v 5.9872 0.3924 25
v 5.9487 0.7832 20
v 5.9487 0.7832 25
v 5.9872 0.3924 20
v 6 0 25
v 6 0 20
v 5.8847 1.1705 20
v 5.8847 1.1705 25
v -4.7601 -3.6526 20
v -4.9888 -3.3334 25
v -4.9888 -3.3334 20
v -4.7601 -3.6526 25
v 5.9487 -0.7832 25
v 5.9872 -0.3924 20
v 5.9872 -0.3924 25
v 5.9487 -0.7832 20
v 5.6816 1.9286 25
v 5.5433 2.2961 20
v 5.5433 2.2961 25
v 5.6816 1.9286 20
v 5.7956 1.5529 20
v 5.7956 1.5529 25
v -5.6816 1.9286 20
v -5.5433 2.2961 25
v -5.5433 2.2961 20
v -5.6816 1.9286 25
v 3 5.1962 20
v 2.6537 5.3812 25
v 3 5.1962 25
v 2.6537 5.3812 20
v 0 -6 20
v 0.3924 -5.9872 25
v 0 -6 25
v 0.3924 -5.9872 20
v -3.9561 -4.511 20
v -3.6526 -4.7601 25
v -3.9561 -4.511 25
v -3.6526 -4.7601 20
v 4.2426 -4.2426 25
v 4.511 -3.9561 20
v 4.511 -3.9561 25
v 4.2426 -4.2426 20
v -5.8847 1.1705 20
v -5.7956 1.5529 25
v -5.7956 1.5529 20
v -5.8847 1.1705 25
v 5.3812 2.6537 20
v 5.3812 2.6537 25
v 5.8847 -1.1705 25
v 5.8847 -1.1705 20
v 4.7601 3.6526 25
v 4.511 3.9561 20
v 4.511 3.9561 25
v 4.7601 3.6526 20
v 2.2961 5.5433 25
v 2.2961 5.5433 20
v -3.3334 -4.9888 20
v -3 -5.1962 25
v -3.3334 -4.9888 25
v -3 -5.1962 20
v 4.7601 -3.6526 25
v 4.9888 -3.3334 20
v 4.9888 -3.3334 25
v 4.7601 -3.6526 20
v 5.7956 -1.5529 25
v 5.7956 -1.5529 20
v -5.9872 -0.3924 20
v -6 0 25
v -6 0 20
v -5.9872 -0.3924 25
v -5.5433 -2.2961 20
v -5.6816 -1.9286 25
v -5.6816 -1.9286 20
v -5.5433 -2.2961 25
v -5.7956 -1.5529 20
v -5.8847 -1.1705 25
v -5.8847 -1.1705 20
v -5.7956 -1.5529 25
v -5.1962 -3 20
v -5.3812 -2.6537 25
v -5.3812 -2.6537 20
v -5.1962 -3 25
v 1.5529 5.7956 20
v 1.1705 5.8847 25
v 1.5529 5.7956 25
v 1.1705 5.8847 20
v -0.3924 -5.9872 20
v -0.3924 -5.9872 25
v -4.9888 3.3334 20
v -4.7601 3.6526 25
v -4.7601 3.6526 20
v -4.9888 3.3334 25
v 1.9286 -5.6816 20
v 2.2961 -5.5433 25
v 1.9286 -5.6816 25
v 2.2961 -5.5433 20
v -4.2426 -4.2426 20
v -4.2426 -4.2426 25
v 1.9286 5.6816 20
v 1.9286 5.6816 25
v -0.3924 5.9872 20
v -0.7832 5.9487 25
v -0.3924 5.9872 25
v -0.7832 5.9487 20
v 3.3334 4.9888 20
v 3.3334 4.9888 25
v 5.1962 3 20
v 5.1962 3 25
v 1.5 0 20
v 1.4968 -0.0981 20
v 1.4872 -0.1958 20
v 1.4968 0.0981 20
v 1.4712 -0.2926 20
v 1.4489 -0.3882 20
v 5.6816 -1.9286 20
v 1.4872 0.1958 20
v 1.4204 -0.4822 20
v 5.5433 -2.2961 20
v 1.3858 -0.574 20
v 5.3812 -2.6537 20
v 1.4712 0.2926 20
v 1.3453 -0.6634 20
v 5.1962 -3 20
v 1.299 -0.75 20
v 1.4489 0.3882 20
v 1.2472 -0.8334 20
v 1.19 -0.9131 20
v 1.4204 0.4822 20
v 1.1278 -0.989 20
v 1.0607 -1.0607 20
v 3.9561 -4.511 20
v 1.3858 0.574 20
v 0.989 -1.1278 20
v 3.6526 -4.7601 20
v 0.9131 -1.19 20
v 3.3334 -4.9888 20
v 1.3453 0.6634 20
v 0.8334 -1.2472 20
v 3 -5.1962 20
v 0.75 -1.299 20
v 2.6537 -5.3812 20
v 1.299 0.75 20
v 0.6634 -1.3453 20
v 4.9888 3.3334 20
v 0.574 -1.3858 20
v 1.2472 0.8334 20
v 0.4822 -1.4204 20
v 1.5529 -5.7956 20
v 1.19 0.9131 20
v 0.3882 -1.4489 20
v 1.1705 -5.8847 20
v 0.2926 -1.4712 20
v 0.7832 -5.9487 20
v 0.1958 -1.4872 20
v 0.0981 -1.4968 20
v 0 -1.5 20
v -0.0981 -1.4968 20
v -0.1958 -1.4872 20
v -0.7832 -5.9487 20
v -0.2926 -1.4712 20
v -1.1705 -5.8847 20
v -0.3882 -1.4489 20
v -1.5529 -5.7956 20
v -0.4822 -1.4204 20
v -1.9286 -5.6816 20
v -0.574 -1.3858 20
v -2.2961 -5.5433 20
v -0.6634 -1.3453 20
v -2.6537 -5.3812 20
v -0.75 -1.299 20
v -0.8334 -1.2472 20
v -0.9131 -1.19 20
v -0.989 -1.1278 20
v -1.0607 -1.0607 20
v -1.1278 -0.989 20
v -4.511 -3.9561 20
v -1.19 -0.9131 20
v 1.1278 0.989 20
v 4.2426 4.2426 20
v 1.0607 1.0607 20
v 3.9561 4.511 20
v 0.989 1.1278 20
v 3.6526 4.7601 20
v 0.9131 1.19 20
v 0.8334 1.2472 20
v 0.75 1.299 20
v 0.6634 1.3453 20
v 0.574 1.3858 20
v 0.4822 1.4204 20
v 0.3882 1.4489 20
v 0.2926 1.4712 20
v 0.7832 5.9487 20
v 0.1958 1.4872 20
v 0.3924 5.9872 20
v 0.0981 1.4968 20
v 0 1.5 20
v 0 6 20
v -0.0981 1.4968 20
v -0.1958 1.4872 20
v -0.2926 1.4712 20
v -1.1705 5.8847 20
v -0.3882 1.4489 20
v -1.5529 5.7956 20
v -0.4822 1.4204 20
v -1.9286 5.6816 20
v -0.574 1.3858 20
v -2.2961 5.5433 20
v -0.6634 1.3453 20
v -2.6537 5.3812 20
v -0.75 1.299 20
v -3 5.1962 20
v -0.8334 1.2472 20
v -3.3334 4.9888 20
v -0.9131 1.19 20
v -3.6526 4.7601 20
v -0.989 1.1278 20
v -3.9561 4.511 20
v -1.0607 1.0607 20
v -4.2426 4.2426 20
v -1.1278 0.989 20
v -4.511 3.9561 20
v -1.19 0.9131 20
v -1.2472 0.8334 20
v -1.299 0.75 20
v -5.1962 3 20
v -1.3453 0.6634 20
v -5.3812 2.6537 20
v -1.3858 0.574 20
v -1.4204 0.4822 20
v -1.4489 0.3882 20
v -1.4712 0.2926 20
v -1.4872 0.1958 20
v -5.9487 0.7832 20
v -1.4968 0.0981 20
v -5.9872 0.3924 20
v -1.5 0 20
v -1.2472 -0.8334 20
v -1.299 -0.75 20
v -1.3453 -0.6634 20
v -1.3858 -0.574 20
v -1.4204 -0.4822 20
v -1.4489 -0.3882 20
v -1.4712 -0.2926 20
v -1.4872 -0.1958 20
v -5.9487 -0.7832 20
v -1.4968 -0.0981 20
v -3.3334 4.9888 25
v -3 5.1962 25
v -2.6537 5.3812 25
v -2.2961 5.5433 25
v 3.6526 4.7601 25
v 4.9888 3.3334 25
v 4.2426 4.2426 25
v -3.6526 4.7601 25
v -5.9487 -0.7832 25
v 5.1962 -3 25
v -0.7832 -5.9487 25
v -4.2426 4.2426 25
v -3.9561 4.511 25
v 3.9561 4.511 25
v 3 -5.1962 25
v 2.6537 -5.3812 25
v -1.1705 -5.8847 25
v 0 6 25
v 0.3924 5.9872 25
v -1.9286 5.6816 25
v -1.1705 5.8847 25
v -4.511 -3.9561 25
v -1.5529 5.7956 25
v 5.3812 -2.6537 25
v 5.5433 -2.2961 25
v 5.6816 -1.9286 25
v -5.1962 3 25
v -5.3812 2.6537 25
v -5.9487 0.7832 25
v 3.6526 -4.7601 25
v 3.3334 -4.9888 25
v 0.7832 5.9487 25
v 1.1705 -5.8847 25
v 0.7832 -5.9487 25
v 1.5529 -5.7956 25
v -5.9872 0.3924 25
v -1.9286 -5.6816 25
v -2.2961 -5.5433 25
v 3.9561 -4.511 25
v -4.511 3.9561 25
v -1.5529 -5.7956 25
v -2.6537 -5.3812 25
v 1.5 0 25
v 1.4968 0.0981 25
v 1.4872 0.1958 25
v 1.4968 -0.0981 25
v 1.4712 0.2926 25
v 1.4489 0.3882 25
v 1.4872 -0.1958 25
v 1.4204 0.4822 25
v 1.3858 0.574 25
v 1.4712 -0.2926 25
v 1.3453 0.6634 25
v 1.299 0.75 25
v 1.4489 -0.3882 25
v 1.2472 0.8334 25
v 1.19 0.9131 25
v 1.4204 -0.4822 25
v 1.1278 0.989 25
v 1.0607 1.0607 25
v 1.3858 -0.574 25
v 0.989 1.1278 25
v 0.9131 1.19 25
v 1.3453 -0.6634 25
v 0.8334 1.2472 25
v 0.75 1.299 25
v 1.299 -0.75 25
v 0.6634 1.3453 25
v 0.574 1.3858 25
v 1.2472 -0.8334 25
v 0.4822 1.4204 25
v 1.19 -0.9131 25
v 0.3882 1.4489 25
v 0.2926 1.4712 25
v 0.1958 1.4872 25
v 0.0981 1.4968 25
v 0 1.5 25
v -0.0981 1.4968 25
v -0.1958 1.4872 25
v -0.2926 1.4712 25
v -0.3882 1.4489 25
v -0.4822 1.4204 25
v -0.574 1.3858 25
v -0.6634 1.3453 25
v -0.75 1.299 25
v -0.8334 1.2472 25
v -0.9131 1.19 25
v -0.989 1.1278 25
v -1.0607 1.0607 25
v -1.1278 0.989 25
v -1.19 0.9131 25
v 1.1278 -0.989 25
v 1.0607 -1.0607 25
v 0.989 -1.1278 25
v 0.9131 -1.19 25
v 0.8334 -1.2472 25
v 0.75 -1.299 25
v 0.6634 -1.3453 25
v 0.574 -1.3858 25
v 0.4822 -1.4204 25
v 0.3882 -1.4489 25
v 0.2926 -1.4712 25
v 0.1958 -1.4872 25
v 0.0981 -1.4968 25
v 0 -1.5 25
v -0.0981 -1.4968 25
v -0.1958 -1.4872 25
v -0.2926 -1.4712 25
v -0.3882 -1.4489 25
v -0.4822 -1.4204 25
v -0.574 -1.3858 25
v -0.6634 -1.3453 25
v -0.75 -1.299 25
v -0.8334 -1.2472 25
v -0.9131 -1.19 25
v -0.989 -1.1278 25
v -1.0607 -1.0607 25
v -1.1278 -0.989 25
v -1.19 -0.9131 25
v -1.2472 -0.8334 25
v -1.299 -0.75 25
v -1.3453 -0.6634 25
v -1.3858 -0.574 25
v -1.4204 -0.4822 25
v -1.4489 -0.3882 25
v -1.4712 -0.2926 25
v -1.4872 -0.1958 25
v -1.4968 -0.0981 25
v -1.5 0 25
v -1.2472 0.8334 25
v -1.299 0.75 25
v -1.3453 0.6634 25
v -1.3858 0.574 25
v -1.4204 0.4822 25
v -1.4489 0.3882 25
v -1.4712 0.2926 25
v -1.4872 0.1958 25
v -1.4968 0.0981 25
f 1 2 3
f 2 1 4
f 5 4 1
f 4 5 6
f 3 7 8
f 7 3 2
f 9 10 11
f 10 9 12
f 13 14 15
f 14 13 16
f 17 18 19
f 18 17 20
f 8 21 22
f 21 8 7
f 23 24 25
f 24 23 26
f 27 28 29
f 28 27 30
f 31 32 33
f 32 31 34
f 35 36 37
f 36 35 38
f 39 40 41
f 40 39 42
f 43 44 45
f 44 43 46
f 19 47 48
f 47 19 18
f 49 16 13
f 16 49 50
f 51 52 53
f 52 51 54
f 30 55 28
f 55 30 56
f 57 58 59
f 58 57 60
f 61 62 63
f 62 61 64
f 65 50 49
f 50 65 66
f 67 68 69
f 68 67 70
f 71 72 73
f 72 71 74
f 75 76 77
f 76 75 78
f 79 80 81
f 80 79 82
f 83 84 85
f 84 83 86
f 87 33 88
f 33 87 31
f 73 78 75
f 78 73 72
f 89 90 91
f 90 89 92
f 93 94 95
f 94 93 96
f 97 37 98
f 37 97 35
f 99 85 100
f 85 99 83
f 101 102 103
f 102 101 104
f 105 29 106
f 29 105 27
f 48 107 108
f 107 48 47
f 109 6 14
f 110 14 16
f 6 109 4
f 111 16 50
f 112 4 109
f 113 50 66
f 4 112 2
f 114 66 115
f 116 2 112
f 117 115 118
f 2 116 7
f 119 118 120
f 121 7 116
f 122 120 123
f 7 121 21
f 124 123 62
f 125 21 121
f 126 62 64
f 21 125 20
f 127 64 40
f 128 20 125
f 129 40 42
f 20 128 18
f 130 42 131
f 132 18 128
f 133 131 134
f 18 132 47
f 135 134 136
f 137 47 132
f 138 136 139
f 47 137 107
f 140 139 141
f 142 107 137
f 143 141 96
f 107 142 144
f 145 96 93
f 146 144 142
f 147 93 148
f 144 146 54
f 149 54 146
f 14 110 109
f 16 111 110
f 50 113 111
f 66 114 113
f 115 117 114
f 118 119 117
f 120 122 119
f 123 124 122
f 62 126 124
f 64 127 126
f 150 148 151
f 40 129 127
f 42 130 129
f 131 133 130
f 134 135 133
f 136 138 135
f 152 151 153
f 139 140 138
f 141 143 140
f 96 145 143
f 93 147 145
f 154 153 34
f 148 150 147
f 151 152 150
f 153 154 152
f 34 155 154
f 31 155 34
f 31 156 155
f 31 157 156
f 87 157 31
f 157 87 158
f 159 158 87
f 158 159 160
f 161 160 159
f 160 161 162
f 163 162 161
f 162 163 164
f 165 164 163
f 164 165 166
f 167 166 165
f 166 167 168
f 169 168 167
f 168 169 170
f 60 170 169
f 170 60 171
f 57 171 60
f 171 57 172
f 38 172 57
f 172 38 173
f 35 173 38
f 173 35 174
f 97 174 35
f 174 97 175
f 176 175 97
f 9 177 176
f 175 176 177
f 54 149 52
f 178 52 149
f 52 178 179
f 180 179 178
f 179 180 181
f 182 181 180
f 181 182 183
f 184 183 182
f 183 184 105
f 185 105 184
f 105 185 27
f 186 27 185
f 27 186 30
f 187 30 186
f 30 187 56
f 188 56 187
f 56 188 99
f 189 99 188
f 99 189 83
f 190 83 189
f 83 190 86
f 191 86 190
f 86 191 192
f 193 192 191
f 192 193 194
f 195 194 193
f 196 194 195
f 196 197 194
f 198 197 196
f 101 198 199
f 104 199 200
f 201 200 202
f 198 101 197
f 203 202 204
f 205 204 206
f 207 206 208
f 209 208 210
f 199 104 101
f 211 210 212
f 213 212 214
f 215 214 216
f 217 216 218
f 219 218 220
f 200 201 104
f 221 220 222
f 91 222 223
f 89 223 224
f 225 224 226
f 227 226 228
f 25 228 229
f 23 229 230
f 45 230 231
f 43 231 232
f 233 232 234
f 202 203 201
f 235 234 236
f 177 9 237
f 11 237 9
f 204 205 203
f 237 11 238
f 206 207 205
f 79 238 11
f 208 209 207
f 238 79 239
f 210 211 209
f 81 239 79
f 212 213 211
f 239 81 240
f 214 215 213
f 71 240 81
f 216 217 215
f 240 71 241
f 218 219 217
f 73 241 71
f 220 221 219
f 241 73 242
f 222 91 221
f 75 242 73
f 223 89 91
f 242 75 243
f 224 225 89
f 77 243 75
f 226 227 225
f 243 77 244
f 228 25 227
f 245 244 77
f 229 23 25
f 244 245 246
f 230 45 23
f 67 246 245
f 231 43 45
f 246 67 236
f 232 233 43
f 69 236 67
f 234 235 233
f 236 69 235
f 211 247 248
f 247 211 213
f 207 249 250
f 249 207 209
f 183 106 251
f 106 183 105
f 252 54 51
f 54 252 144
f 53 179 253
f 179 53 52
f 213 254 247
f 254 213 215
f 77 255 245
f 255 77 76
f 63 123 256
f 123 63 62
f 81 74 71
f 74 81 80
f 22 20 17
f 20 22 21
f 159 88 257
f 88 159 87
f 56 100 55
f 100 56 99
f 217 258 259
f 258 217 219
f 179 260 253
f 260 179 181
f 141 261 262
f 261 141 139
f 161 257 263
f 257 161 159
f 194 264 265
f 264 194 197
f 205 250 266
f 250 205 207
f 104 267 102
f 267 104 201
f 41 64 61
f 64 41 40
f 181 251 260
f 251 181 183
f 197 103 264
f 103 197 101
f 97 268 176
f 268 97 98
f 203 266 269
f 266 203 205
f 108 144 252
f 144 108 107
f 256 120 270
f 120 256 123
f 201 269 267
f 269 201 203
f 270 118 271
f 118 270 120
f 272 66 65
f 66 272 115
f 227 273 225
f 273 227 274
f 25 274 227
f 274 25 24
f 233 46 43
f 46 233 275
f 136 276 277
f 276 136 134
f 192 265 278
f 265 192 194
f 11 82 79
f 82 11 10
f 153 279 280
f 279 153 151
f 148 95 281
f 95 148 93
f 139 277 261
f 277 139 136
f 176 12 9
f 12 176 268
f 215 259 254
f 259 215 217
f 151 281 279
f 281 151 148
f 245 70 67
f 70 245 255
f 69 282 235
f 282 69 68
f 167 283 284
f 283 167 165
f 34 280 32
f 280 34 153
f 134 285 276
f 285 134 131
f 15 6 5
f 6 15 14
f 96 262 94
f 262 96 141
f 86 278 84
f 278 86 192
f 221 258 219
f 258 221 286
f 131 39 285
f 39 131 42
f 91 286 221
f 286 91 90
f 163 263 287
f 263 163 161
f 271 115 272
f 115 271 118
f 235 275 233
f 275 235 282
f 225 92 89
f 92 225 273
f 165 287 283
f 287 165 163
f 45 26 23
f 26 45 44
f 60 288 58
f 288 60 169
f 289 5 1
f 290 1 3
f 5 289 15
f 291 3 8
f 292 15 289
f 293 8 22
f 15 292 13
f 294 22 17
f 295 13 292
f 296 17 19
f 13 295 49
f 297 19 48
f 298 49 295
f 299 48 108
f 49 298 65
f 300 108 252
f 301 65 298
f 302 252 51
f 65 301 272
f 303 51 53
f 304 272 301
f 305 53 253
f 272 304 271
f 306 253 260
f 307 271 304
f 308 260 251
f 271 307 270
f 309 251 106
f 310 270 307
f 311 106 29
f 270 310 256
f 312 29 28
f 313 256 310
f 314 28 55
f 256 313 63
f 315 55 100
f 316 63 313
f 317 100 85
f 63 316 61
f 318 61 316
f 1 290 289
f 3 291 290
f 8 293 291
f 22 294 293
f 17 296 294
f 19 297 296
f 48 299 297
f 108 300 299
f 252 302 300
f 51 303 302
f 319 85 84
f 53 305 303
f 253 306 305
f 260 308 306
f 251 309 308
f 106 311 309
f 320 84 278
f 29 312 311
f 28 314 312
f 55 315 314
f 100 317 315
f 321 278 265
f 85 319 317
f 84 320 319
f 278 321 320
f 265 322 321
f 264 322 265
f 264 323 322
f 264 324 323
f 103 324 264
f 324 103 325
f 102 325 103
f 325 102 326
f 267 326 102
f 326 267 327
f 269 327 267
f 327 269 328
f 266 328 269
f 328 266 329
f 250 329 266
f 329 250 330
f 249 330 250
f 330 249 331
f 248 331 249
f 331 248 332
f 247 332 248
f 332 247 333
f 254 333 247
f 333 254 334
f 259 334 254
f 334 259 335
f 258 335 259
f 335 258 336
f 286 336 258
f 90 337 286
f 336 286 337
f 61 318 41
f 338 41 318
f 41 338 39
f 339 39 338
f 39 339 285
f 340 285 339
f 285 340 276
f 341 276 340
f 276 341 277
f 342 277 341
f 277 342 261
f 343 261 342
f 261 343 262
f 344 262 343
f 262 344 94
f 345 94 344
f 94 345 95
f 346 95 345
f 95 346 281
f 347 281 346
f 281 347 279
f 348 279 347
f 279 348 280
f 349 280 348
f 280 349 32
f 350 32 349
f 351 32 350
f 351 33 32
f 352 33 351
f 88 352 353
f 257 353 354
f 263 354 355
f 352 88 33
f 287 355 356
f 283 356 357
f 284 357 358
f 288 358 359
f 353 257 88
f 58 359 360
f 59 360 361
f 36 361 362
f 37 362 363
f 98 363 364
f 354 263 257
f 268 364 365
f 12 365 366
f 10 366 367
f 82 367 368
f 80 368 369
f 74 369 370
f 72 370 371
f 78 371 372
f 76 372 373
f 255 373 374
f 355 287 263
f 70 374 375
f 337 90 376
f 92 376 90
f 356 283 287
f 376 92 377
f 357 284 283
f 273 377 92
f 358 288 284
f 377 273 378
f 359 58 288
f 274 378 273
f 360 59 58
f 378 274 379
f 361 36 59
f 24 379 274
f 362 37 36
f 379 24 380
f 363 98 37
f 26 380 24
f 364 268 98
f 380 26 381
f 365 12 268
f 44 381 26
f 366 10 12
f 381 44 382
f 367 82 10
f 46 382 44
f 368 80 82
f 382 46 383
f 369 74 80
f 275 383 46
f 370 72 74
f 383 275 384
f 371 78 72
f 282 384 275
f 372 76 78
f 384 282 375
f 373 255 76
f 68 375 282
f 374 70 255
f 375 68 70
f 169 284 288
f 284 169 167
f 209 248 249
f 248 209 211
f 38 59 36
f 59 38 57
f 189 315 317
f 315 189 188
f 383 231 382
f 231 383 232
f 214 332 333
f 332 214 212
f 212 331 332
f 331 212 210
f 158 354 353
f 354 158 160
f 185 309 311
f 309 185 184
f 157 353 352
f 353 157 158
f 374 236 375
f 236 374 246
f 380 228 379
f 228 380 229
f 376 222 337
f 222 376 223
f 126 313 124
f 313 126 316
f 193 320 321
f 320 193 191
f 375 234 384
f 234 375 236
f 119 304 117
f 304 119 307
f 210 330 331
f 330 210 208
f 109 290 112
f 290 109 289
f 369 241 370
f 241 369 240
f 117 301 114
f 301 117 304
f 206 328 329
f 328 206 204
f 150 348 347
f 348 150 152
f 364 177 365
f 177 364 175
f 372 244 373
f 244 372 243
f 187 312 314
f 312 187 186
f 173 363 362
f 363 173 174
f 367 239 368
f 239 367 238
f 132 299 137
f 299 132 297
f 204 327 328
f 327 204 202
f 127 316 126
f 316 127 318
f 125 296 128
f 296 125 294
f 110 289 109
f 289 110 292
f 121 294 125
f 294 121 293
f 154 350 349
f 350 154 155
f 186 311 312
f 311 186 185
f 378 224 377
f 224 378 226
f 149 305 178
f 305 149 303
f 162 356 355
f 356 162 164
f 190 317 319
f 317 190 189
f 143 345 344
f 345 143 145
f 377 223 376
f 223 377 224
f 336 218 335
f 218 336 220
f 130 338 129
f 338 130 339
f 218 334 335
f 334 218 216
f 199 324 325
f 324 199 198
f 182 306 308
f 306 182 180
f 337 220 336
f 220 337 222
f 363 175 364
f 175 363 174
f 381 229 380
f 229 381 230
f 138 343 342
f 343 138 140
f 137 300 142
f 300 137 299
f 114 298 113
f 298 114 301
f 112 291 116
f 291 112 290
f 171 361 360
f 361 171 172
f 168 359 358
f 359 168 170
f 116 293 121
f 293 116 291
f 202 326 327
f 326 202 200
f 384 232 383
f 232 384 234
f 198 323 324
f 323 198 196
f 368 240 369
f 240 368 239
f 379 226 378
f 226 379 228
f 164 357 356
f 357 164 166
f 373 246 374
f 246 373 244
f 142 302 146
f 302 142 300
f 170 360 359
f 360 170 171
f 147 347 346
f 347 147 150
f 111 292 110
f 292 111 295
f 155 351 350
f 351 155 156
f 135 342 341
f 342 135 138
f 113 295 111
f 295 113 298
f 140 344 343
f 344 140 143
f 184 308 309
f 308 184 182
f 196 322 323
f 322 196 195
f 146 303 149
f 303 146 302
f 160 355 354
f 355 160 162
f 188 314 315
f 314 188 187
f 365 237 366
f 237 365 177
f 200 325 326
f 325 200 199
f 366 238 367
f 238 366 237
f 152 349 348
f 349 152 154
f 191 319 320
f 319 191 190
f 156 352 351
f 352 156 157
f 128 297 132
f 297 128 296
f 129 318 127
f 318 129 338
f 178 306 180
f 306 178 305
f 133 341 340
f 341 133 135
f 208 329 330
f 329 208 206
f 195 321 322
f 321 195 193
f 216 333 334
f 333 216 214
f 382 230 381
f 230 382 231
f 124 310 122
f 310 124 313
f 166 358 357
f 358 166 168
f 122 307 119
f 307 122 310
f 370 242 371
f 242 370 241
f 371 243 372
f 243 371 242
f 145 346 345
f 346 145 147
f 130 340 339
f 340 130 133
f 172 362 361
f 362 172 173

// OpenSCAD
// Hose-barb reducer: 8 mm tubing (barbs) -> 5 mm tubing (barbs)
// Print orientation: standing upright along Z, centred on origin in X/Y

// ---------------- Parameters ----------------
bore       = 3;    // through-bore diameter (mm)
eps        = 0.5;  // cutter overshoot past faces (mm)

// Lower section (z = 0 .. 20): 8 mm tubing barbs
z_barb_a   = 20;   // height of lower barbs (mm)
outer_a    = [7.5, 9.5]; // outer diameter at bottom and top of barb (mm)
n_barb_a   = 2;    // number of barbs, stacked

// Collar (z = 20 .. 25)
z_collar   = 5;    // collar thickness (mm)
d_collar   = 12;   // collar outer diameter (mm)

// Upper section (z = 25 .. 41): 5 mm tubing barbs
z_barb_b   = 16;   // height of upper barbs (mm)
outer_b    = [6.5, 5.0]; // outer diameter at bottom and top of barb (mm)
n_barb_b   = 2;    // number of barbs, stacked

total_h    = z_barb_a + z_collar + z_barb_b; // = 41 mm

$fn = 96;          // curve resolution

// ---------------- Model ----------------
difference() {
    union() {
        // Lower barbs
        for (i = [0 : n_barb_a - 1])
            translate([0, 0, i * z_barb_a / n_barb_a])
                linear_extrude(height = z_barb_a / n_barb_a)
                    polygon(points = [
                        [-outer_a[0] / 2, 0],
                        [ outer_a[0] / 2, 0],
                        [ outer_a[1] / 2, 0],
                        [0, outer_a[1] / 2],
                        [0, -outer_a[1] / 2]
                    ]);

        // Collar
        translate([0, 0, z_barb_a])
            cylinder(h = z_collar, d = d_collar);

        // Upper barbs
        for (i = [0 : n_barb_b - 1])
            translate([0, 0, z_barb_a + z_collar + i * z_barb_b / n_barb_b])
                linear_extrude(height = z_barb_b / n_barb_b)
                    polygon(points = [
                        [-outer_b[0] / 2, 0],
                        [ outer_b[0] / 2, 0],
                        [ outer_b[1] / 2, 0],
                        [0, outer_b[1] / 2],
                        [0, -outer_b[1] / 2]
                    ]);
    }

    // Full-length through-bore
    translate([0, 0, -eps])
        cylinder(h = total_h + 2 * eps, d = bore);
}
